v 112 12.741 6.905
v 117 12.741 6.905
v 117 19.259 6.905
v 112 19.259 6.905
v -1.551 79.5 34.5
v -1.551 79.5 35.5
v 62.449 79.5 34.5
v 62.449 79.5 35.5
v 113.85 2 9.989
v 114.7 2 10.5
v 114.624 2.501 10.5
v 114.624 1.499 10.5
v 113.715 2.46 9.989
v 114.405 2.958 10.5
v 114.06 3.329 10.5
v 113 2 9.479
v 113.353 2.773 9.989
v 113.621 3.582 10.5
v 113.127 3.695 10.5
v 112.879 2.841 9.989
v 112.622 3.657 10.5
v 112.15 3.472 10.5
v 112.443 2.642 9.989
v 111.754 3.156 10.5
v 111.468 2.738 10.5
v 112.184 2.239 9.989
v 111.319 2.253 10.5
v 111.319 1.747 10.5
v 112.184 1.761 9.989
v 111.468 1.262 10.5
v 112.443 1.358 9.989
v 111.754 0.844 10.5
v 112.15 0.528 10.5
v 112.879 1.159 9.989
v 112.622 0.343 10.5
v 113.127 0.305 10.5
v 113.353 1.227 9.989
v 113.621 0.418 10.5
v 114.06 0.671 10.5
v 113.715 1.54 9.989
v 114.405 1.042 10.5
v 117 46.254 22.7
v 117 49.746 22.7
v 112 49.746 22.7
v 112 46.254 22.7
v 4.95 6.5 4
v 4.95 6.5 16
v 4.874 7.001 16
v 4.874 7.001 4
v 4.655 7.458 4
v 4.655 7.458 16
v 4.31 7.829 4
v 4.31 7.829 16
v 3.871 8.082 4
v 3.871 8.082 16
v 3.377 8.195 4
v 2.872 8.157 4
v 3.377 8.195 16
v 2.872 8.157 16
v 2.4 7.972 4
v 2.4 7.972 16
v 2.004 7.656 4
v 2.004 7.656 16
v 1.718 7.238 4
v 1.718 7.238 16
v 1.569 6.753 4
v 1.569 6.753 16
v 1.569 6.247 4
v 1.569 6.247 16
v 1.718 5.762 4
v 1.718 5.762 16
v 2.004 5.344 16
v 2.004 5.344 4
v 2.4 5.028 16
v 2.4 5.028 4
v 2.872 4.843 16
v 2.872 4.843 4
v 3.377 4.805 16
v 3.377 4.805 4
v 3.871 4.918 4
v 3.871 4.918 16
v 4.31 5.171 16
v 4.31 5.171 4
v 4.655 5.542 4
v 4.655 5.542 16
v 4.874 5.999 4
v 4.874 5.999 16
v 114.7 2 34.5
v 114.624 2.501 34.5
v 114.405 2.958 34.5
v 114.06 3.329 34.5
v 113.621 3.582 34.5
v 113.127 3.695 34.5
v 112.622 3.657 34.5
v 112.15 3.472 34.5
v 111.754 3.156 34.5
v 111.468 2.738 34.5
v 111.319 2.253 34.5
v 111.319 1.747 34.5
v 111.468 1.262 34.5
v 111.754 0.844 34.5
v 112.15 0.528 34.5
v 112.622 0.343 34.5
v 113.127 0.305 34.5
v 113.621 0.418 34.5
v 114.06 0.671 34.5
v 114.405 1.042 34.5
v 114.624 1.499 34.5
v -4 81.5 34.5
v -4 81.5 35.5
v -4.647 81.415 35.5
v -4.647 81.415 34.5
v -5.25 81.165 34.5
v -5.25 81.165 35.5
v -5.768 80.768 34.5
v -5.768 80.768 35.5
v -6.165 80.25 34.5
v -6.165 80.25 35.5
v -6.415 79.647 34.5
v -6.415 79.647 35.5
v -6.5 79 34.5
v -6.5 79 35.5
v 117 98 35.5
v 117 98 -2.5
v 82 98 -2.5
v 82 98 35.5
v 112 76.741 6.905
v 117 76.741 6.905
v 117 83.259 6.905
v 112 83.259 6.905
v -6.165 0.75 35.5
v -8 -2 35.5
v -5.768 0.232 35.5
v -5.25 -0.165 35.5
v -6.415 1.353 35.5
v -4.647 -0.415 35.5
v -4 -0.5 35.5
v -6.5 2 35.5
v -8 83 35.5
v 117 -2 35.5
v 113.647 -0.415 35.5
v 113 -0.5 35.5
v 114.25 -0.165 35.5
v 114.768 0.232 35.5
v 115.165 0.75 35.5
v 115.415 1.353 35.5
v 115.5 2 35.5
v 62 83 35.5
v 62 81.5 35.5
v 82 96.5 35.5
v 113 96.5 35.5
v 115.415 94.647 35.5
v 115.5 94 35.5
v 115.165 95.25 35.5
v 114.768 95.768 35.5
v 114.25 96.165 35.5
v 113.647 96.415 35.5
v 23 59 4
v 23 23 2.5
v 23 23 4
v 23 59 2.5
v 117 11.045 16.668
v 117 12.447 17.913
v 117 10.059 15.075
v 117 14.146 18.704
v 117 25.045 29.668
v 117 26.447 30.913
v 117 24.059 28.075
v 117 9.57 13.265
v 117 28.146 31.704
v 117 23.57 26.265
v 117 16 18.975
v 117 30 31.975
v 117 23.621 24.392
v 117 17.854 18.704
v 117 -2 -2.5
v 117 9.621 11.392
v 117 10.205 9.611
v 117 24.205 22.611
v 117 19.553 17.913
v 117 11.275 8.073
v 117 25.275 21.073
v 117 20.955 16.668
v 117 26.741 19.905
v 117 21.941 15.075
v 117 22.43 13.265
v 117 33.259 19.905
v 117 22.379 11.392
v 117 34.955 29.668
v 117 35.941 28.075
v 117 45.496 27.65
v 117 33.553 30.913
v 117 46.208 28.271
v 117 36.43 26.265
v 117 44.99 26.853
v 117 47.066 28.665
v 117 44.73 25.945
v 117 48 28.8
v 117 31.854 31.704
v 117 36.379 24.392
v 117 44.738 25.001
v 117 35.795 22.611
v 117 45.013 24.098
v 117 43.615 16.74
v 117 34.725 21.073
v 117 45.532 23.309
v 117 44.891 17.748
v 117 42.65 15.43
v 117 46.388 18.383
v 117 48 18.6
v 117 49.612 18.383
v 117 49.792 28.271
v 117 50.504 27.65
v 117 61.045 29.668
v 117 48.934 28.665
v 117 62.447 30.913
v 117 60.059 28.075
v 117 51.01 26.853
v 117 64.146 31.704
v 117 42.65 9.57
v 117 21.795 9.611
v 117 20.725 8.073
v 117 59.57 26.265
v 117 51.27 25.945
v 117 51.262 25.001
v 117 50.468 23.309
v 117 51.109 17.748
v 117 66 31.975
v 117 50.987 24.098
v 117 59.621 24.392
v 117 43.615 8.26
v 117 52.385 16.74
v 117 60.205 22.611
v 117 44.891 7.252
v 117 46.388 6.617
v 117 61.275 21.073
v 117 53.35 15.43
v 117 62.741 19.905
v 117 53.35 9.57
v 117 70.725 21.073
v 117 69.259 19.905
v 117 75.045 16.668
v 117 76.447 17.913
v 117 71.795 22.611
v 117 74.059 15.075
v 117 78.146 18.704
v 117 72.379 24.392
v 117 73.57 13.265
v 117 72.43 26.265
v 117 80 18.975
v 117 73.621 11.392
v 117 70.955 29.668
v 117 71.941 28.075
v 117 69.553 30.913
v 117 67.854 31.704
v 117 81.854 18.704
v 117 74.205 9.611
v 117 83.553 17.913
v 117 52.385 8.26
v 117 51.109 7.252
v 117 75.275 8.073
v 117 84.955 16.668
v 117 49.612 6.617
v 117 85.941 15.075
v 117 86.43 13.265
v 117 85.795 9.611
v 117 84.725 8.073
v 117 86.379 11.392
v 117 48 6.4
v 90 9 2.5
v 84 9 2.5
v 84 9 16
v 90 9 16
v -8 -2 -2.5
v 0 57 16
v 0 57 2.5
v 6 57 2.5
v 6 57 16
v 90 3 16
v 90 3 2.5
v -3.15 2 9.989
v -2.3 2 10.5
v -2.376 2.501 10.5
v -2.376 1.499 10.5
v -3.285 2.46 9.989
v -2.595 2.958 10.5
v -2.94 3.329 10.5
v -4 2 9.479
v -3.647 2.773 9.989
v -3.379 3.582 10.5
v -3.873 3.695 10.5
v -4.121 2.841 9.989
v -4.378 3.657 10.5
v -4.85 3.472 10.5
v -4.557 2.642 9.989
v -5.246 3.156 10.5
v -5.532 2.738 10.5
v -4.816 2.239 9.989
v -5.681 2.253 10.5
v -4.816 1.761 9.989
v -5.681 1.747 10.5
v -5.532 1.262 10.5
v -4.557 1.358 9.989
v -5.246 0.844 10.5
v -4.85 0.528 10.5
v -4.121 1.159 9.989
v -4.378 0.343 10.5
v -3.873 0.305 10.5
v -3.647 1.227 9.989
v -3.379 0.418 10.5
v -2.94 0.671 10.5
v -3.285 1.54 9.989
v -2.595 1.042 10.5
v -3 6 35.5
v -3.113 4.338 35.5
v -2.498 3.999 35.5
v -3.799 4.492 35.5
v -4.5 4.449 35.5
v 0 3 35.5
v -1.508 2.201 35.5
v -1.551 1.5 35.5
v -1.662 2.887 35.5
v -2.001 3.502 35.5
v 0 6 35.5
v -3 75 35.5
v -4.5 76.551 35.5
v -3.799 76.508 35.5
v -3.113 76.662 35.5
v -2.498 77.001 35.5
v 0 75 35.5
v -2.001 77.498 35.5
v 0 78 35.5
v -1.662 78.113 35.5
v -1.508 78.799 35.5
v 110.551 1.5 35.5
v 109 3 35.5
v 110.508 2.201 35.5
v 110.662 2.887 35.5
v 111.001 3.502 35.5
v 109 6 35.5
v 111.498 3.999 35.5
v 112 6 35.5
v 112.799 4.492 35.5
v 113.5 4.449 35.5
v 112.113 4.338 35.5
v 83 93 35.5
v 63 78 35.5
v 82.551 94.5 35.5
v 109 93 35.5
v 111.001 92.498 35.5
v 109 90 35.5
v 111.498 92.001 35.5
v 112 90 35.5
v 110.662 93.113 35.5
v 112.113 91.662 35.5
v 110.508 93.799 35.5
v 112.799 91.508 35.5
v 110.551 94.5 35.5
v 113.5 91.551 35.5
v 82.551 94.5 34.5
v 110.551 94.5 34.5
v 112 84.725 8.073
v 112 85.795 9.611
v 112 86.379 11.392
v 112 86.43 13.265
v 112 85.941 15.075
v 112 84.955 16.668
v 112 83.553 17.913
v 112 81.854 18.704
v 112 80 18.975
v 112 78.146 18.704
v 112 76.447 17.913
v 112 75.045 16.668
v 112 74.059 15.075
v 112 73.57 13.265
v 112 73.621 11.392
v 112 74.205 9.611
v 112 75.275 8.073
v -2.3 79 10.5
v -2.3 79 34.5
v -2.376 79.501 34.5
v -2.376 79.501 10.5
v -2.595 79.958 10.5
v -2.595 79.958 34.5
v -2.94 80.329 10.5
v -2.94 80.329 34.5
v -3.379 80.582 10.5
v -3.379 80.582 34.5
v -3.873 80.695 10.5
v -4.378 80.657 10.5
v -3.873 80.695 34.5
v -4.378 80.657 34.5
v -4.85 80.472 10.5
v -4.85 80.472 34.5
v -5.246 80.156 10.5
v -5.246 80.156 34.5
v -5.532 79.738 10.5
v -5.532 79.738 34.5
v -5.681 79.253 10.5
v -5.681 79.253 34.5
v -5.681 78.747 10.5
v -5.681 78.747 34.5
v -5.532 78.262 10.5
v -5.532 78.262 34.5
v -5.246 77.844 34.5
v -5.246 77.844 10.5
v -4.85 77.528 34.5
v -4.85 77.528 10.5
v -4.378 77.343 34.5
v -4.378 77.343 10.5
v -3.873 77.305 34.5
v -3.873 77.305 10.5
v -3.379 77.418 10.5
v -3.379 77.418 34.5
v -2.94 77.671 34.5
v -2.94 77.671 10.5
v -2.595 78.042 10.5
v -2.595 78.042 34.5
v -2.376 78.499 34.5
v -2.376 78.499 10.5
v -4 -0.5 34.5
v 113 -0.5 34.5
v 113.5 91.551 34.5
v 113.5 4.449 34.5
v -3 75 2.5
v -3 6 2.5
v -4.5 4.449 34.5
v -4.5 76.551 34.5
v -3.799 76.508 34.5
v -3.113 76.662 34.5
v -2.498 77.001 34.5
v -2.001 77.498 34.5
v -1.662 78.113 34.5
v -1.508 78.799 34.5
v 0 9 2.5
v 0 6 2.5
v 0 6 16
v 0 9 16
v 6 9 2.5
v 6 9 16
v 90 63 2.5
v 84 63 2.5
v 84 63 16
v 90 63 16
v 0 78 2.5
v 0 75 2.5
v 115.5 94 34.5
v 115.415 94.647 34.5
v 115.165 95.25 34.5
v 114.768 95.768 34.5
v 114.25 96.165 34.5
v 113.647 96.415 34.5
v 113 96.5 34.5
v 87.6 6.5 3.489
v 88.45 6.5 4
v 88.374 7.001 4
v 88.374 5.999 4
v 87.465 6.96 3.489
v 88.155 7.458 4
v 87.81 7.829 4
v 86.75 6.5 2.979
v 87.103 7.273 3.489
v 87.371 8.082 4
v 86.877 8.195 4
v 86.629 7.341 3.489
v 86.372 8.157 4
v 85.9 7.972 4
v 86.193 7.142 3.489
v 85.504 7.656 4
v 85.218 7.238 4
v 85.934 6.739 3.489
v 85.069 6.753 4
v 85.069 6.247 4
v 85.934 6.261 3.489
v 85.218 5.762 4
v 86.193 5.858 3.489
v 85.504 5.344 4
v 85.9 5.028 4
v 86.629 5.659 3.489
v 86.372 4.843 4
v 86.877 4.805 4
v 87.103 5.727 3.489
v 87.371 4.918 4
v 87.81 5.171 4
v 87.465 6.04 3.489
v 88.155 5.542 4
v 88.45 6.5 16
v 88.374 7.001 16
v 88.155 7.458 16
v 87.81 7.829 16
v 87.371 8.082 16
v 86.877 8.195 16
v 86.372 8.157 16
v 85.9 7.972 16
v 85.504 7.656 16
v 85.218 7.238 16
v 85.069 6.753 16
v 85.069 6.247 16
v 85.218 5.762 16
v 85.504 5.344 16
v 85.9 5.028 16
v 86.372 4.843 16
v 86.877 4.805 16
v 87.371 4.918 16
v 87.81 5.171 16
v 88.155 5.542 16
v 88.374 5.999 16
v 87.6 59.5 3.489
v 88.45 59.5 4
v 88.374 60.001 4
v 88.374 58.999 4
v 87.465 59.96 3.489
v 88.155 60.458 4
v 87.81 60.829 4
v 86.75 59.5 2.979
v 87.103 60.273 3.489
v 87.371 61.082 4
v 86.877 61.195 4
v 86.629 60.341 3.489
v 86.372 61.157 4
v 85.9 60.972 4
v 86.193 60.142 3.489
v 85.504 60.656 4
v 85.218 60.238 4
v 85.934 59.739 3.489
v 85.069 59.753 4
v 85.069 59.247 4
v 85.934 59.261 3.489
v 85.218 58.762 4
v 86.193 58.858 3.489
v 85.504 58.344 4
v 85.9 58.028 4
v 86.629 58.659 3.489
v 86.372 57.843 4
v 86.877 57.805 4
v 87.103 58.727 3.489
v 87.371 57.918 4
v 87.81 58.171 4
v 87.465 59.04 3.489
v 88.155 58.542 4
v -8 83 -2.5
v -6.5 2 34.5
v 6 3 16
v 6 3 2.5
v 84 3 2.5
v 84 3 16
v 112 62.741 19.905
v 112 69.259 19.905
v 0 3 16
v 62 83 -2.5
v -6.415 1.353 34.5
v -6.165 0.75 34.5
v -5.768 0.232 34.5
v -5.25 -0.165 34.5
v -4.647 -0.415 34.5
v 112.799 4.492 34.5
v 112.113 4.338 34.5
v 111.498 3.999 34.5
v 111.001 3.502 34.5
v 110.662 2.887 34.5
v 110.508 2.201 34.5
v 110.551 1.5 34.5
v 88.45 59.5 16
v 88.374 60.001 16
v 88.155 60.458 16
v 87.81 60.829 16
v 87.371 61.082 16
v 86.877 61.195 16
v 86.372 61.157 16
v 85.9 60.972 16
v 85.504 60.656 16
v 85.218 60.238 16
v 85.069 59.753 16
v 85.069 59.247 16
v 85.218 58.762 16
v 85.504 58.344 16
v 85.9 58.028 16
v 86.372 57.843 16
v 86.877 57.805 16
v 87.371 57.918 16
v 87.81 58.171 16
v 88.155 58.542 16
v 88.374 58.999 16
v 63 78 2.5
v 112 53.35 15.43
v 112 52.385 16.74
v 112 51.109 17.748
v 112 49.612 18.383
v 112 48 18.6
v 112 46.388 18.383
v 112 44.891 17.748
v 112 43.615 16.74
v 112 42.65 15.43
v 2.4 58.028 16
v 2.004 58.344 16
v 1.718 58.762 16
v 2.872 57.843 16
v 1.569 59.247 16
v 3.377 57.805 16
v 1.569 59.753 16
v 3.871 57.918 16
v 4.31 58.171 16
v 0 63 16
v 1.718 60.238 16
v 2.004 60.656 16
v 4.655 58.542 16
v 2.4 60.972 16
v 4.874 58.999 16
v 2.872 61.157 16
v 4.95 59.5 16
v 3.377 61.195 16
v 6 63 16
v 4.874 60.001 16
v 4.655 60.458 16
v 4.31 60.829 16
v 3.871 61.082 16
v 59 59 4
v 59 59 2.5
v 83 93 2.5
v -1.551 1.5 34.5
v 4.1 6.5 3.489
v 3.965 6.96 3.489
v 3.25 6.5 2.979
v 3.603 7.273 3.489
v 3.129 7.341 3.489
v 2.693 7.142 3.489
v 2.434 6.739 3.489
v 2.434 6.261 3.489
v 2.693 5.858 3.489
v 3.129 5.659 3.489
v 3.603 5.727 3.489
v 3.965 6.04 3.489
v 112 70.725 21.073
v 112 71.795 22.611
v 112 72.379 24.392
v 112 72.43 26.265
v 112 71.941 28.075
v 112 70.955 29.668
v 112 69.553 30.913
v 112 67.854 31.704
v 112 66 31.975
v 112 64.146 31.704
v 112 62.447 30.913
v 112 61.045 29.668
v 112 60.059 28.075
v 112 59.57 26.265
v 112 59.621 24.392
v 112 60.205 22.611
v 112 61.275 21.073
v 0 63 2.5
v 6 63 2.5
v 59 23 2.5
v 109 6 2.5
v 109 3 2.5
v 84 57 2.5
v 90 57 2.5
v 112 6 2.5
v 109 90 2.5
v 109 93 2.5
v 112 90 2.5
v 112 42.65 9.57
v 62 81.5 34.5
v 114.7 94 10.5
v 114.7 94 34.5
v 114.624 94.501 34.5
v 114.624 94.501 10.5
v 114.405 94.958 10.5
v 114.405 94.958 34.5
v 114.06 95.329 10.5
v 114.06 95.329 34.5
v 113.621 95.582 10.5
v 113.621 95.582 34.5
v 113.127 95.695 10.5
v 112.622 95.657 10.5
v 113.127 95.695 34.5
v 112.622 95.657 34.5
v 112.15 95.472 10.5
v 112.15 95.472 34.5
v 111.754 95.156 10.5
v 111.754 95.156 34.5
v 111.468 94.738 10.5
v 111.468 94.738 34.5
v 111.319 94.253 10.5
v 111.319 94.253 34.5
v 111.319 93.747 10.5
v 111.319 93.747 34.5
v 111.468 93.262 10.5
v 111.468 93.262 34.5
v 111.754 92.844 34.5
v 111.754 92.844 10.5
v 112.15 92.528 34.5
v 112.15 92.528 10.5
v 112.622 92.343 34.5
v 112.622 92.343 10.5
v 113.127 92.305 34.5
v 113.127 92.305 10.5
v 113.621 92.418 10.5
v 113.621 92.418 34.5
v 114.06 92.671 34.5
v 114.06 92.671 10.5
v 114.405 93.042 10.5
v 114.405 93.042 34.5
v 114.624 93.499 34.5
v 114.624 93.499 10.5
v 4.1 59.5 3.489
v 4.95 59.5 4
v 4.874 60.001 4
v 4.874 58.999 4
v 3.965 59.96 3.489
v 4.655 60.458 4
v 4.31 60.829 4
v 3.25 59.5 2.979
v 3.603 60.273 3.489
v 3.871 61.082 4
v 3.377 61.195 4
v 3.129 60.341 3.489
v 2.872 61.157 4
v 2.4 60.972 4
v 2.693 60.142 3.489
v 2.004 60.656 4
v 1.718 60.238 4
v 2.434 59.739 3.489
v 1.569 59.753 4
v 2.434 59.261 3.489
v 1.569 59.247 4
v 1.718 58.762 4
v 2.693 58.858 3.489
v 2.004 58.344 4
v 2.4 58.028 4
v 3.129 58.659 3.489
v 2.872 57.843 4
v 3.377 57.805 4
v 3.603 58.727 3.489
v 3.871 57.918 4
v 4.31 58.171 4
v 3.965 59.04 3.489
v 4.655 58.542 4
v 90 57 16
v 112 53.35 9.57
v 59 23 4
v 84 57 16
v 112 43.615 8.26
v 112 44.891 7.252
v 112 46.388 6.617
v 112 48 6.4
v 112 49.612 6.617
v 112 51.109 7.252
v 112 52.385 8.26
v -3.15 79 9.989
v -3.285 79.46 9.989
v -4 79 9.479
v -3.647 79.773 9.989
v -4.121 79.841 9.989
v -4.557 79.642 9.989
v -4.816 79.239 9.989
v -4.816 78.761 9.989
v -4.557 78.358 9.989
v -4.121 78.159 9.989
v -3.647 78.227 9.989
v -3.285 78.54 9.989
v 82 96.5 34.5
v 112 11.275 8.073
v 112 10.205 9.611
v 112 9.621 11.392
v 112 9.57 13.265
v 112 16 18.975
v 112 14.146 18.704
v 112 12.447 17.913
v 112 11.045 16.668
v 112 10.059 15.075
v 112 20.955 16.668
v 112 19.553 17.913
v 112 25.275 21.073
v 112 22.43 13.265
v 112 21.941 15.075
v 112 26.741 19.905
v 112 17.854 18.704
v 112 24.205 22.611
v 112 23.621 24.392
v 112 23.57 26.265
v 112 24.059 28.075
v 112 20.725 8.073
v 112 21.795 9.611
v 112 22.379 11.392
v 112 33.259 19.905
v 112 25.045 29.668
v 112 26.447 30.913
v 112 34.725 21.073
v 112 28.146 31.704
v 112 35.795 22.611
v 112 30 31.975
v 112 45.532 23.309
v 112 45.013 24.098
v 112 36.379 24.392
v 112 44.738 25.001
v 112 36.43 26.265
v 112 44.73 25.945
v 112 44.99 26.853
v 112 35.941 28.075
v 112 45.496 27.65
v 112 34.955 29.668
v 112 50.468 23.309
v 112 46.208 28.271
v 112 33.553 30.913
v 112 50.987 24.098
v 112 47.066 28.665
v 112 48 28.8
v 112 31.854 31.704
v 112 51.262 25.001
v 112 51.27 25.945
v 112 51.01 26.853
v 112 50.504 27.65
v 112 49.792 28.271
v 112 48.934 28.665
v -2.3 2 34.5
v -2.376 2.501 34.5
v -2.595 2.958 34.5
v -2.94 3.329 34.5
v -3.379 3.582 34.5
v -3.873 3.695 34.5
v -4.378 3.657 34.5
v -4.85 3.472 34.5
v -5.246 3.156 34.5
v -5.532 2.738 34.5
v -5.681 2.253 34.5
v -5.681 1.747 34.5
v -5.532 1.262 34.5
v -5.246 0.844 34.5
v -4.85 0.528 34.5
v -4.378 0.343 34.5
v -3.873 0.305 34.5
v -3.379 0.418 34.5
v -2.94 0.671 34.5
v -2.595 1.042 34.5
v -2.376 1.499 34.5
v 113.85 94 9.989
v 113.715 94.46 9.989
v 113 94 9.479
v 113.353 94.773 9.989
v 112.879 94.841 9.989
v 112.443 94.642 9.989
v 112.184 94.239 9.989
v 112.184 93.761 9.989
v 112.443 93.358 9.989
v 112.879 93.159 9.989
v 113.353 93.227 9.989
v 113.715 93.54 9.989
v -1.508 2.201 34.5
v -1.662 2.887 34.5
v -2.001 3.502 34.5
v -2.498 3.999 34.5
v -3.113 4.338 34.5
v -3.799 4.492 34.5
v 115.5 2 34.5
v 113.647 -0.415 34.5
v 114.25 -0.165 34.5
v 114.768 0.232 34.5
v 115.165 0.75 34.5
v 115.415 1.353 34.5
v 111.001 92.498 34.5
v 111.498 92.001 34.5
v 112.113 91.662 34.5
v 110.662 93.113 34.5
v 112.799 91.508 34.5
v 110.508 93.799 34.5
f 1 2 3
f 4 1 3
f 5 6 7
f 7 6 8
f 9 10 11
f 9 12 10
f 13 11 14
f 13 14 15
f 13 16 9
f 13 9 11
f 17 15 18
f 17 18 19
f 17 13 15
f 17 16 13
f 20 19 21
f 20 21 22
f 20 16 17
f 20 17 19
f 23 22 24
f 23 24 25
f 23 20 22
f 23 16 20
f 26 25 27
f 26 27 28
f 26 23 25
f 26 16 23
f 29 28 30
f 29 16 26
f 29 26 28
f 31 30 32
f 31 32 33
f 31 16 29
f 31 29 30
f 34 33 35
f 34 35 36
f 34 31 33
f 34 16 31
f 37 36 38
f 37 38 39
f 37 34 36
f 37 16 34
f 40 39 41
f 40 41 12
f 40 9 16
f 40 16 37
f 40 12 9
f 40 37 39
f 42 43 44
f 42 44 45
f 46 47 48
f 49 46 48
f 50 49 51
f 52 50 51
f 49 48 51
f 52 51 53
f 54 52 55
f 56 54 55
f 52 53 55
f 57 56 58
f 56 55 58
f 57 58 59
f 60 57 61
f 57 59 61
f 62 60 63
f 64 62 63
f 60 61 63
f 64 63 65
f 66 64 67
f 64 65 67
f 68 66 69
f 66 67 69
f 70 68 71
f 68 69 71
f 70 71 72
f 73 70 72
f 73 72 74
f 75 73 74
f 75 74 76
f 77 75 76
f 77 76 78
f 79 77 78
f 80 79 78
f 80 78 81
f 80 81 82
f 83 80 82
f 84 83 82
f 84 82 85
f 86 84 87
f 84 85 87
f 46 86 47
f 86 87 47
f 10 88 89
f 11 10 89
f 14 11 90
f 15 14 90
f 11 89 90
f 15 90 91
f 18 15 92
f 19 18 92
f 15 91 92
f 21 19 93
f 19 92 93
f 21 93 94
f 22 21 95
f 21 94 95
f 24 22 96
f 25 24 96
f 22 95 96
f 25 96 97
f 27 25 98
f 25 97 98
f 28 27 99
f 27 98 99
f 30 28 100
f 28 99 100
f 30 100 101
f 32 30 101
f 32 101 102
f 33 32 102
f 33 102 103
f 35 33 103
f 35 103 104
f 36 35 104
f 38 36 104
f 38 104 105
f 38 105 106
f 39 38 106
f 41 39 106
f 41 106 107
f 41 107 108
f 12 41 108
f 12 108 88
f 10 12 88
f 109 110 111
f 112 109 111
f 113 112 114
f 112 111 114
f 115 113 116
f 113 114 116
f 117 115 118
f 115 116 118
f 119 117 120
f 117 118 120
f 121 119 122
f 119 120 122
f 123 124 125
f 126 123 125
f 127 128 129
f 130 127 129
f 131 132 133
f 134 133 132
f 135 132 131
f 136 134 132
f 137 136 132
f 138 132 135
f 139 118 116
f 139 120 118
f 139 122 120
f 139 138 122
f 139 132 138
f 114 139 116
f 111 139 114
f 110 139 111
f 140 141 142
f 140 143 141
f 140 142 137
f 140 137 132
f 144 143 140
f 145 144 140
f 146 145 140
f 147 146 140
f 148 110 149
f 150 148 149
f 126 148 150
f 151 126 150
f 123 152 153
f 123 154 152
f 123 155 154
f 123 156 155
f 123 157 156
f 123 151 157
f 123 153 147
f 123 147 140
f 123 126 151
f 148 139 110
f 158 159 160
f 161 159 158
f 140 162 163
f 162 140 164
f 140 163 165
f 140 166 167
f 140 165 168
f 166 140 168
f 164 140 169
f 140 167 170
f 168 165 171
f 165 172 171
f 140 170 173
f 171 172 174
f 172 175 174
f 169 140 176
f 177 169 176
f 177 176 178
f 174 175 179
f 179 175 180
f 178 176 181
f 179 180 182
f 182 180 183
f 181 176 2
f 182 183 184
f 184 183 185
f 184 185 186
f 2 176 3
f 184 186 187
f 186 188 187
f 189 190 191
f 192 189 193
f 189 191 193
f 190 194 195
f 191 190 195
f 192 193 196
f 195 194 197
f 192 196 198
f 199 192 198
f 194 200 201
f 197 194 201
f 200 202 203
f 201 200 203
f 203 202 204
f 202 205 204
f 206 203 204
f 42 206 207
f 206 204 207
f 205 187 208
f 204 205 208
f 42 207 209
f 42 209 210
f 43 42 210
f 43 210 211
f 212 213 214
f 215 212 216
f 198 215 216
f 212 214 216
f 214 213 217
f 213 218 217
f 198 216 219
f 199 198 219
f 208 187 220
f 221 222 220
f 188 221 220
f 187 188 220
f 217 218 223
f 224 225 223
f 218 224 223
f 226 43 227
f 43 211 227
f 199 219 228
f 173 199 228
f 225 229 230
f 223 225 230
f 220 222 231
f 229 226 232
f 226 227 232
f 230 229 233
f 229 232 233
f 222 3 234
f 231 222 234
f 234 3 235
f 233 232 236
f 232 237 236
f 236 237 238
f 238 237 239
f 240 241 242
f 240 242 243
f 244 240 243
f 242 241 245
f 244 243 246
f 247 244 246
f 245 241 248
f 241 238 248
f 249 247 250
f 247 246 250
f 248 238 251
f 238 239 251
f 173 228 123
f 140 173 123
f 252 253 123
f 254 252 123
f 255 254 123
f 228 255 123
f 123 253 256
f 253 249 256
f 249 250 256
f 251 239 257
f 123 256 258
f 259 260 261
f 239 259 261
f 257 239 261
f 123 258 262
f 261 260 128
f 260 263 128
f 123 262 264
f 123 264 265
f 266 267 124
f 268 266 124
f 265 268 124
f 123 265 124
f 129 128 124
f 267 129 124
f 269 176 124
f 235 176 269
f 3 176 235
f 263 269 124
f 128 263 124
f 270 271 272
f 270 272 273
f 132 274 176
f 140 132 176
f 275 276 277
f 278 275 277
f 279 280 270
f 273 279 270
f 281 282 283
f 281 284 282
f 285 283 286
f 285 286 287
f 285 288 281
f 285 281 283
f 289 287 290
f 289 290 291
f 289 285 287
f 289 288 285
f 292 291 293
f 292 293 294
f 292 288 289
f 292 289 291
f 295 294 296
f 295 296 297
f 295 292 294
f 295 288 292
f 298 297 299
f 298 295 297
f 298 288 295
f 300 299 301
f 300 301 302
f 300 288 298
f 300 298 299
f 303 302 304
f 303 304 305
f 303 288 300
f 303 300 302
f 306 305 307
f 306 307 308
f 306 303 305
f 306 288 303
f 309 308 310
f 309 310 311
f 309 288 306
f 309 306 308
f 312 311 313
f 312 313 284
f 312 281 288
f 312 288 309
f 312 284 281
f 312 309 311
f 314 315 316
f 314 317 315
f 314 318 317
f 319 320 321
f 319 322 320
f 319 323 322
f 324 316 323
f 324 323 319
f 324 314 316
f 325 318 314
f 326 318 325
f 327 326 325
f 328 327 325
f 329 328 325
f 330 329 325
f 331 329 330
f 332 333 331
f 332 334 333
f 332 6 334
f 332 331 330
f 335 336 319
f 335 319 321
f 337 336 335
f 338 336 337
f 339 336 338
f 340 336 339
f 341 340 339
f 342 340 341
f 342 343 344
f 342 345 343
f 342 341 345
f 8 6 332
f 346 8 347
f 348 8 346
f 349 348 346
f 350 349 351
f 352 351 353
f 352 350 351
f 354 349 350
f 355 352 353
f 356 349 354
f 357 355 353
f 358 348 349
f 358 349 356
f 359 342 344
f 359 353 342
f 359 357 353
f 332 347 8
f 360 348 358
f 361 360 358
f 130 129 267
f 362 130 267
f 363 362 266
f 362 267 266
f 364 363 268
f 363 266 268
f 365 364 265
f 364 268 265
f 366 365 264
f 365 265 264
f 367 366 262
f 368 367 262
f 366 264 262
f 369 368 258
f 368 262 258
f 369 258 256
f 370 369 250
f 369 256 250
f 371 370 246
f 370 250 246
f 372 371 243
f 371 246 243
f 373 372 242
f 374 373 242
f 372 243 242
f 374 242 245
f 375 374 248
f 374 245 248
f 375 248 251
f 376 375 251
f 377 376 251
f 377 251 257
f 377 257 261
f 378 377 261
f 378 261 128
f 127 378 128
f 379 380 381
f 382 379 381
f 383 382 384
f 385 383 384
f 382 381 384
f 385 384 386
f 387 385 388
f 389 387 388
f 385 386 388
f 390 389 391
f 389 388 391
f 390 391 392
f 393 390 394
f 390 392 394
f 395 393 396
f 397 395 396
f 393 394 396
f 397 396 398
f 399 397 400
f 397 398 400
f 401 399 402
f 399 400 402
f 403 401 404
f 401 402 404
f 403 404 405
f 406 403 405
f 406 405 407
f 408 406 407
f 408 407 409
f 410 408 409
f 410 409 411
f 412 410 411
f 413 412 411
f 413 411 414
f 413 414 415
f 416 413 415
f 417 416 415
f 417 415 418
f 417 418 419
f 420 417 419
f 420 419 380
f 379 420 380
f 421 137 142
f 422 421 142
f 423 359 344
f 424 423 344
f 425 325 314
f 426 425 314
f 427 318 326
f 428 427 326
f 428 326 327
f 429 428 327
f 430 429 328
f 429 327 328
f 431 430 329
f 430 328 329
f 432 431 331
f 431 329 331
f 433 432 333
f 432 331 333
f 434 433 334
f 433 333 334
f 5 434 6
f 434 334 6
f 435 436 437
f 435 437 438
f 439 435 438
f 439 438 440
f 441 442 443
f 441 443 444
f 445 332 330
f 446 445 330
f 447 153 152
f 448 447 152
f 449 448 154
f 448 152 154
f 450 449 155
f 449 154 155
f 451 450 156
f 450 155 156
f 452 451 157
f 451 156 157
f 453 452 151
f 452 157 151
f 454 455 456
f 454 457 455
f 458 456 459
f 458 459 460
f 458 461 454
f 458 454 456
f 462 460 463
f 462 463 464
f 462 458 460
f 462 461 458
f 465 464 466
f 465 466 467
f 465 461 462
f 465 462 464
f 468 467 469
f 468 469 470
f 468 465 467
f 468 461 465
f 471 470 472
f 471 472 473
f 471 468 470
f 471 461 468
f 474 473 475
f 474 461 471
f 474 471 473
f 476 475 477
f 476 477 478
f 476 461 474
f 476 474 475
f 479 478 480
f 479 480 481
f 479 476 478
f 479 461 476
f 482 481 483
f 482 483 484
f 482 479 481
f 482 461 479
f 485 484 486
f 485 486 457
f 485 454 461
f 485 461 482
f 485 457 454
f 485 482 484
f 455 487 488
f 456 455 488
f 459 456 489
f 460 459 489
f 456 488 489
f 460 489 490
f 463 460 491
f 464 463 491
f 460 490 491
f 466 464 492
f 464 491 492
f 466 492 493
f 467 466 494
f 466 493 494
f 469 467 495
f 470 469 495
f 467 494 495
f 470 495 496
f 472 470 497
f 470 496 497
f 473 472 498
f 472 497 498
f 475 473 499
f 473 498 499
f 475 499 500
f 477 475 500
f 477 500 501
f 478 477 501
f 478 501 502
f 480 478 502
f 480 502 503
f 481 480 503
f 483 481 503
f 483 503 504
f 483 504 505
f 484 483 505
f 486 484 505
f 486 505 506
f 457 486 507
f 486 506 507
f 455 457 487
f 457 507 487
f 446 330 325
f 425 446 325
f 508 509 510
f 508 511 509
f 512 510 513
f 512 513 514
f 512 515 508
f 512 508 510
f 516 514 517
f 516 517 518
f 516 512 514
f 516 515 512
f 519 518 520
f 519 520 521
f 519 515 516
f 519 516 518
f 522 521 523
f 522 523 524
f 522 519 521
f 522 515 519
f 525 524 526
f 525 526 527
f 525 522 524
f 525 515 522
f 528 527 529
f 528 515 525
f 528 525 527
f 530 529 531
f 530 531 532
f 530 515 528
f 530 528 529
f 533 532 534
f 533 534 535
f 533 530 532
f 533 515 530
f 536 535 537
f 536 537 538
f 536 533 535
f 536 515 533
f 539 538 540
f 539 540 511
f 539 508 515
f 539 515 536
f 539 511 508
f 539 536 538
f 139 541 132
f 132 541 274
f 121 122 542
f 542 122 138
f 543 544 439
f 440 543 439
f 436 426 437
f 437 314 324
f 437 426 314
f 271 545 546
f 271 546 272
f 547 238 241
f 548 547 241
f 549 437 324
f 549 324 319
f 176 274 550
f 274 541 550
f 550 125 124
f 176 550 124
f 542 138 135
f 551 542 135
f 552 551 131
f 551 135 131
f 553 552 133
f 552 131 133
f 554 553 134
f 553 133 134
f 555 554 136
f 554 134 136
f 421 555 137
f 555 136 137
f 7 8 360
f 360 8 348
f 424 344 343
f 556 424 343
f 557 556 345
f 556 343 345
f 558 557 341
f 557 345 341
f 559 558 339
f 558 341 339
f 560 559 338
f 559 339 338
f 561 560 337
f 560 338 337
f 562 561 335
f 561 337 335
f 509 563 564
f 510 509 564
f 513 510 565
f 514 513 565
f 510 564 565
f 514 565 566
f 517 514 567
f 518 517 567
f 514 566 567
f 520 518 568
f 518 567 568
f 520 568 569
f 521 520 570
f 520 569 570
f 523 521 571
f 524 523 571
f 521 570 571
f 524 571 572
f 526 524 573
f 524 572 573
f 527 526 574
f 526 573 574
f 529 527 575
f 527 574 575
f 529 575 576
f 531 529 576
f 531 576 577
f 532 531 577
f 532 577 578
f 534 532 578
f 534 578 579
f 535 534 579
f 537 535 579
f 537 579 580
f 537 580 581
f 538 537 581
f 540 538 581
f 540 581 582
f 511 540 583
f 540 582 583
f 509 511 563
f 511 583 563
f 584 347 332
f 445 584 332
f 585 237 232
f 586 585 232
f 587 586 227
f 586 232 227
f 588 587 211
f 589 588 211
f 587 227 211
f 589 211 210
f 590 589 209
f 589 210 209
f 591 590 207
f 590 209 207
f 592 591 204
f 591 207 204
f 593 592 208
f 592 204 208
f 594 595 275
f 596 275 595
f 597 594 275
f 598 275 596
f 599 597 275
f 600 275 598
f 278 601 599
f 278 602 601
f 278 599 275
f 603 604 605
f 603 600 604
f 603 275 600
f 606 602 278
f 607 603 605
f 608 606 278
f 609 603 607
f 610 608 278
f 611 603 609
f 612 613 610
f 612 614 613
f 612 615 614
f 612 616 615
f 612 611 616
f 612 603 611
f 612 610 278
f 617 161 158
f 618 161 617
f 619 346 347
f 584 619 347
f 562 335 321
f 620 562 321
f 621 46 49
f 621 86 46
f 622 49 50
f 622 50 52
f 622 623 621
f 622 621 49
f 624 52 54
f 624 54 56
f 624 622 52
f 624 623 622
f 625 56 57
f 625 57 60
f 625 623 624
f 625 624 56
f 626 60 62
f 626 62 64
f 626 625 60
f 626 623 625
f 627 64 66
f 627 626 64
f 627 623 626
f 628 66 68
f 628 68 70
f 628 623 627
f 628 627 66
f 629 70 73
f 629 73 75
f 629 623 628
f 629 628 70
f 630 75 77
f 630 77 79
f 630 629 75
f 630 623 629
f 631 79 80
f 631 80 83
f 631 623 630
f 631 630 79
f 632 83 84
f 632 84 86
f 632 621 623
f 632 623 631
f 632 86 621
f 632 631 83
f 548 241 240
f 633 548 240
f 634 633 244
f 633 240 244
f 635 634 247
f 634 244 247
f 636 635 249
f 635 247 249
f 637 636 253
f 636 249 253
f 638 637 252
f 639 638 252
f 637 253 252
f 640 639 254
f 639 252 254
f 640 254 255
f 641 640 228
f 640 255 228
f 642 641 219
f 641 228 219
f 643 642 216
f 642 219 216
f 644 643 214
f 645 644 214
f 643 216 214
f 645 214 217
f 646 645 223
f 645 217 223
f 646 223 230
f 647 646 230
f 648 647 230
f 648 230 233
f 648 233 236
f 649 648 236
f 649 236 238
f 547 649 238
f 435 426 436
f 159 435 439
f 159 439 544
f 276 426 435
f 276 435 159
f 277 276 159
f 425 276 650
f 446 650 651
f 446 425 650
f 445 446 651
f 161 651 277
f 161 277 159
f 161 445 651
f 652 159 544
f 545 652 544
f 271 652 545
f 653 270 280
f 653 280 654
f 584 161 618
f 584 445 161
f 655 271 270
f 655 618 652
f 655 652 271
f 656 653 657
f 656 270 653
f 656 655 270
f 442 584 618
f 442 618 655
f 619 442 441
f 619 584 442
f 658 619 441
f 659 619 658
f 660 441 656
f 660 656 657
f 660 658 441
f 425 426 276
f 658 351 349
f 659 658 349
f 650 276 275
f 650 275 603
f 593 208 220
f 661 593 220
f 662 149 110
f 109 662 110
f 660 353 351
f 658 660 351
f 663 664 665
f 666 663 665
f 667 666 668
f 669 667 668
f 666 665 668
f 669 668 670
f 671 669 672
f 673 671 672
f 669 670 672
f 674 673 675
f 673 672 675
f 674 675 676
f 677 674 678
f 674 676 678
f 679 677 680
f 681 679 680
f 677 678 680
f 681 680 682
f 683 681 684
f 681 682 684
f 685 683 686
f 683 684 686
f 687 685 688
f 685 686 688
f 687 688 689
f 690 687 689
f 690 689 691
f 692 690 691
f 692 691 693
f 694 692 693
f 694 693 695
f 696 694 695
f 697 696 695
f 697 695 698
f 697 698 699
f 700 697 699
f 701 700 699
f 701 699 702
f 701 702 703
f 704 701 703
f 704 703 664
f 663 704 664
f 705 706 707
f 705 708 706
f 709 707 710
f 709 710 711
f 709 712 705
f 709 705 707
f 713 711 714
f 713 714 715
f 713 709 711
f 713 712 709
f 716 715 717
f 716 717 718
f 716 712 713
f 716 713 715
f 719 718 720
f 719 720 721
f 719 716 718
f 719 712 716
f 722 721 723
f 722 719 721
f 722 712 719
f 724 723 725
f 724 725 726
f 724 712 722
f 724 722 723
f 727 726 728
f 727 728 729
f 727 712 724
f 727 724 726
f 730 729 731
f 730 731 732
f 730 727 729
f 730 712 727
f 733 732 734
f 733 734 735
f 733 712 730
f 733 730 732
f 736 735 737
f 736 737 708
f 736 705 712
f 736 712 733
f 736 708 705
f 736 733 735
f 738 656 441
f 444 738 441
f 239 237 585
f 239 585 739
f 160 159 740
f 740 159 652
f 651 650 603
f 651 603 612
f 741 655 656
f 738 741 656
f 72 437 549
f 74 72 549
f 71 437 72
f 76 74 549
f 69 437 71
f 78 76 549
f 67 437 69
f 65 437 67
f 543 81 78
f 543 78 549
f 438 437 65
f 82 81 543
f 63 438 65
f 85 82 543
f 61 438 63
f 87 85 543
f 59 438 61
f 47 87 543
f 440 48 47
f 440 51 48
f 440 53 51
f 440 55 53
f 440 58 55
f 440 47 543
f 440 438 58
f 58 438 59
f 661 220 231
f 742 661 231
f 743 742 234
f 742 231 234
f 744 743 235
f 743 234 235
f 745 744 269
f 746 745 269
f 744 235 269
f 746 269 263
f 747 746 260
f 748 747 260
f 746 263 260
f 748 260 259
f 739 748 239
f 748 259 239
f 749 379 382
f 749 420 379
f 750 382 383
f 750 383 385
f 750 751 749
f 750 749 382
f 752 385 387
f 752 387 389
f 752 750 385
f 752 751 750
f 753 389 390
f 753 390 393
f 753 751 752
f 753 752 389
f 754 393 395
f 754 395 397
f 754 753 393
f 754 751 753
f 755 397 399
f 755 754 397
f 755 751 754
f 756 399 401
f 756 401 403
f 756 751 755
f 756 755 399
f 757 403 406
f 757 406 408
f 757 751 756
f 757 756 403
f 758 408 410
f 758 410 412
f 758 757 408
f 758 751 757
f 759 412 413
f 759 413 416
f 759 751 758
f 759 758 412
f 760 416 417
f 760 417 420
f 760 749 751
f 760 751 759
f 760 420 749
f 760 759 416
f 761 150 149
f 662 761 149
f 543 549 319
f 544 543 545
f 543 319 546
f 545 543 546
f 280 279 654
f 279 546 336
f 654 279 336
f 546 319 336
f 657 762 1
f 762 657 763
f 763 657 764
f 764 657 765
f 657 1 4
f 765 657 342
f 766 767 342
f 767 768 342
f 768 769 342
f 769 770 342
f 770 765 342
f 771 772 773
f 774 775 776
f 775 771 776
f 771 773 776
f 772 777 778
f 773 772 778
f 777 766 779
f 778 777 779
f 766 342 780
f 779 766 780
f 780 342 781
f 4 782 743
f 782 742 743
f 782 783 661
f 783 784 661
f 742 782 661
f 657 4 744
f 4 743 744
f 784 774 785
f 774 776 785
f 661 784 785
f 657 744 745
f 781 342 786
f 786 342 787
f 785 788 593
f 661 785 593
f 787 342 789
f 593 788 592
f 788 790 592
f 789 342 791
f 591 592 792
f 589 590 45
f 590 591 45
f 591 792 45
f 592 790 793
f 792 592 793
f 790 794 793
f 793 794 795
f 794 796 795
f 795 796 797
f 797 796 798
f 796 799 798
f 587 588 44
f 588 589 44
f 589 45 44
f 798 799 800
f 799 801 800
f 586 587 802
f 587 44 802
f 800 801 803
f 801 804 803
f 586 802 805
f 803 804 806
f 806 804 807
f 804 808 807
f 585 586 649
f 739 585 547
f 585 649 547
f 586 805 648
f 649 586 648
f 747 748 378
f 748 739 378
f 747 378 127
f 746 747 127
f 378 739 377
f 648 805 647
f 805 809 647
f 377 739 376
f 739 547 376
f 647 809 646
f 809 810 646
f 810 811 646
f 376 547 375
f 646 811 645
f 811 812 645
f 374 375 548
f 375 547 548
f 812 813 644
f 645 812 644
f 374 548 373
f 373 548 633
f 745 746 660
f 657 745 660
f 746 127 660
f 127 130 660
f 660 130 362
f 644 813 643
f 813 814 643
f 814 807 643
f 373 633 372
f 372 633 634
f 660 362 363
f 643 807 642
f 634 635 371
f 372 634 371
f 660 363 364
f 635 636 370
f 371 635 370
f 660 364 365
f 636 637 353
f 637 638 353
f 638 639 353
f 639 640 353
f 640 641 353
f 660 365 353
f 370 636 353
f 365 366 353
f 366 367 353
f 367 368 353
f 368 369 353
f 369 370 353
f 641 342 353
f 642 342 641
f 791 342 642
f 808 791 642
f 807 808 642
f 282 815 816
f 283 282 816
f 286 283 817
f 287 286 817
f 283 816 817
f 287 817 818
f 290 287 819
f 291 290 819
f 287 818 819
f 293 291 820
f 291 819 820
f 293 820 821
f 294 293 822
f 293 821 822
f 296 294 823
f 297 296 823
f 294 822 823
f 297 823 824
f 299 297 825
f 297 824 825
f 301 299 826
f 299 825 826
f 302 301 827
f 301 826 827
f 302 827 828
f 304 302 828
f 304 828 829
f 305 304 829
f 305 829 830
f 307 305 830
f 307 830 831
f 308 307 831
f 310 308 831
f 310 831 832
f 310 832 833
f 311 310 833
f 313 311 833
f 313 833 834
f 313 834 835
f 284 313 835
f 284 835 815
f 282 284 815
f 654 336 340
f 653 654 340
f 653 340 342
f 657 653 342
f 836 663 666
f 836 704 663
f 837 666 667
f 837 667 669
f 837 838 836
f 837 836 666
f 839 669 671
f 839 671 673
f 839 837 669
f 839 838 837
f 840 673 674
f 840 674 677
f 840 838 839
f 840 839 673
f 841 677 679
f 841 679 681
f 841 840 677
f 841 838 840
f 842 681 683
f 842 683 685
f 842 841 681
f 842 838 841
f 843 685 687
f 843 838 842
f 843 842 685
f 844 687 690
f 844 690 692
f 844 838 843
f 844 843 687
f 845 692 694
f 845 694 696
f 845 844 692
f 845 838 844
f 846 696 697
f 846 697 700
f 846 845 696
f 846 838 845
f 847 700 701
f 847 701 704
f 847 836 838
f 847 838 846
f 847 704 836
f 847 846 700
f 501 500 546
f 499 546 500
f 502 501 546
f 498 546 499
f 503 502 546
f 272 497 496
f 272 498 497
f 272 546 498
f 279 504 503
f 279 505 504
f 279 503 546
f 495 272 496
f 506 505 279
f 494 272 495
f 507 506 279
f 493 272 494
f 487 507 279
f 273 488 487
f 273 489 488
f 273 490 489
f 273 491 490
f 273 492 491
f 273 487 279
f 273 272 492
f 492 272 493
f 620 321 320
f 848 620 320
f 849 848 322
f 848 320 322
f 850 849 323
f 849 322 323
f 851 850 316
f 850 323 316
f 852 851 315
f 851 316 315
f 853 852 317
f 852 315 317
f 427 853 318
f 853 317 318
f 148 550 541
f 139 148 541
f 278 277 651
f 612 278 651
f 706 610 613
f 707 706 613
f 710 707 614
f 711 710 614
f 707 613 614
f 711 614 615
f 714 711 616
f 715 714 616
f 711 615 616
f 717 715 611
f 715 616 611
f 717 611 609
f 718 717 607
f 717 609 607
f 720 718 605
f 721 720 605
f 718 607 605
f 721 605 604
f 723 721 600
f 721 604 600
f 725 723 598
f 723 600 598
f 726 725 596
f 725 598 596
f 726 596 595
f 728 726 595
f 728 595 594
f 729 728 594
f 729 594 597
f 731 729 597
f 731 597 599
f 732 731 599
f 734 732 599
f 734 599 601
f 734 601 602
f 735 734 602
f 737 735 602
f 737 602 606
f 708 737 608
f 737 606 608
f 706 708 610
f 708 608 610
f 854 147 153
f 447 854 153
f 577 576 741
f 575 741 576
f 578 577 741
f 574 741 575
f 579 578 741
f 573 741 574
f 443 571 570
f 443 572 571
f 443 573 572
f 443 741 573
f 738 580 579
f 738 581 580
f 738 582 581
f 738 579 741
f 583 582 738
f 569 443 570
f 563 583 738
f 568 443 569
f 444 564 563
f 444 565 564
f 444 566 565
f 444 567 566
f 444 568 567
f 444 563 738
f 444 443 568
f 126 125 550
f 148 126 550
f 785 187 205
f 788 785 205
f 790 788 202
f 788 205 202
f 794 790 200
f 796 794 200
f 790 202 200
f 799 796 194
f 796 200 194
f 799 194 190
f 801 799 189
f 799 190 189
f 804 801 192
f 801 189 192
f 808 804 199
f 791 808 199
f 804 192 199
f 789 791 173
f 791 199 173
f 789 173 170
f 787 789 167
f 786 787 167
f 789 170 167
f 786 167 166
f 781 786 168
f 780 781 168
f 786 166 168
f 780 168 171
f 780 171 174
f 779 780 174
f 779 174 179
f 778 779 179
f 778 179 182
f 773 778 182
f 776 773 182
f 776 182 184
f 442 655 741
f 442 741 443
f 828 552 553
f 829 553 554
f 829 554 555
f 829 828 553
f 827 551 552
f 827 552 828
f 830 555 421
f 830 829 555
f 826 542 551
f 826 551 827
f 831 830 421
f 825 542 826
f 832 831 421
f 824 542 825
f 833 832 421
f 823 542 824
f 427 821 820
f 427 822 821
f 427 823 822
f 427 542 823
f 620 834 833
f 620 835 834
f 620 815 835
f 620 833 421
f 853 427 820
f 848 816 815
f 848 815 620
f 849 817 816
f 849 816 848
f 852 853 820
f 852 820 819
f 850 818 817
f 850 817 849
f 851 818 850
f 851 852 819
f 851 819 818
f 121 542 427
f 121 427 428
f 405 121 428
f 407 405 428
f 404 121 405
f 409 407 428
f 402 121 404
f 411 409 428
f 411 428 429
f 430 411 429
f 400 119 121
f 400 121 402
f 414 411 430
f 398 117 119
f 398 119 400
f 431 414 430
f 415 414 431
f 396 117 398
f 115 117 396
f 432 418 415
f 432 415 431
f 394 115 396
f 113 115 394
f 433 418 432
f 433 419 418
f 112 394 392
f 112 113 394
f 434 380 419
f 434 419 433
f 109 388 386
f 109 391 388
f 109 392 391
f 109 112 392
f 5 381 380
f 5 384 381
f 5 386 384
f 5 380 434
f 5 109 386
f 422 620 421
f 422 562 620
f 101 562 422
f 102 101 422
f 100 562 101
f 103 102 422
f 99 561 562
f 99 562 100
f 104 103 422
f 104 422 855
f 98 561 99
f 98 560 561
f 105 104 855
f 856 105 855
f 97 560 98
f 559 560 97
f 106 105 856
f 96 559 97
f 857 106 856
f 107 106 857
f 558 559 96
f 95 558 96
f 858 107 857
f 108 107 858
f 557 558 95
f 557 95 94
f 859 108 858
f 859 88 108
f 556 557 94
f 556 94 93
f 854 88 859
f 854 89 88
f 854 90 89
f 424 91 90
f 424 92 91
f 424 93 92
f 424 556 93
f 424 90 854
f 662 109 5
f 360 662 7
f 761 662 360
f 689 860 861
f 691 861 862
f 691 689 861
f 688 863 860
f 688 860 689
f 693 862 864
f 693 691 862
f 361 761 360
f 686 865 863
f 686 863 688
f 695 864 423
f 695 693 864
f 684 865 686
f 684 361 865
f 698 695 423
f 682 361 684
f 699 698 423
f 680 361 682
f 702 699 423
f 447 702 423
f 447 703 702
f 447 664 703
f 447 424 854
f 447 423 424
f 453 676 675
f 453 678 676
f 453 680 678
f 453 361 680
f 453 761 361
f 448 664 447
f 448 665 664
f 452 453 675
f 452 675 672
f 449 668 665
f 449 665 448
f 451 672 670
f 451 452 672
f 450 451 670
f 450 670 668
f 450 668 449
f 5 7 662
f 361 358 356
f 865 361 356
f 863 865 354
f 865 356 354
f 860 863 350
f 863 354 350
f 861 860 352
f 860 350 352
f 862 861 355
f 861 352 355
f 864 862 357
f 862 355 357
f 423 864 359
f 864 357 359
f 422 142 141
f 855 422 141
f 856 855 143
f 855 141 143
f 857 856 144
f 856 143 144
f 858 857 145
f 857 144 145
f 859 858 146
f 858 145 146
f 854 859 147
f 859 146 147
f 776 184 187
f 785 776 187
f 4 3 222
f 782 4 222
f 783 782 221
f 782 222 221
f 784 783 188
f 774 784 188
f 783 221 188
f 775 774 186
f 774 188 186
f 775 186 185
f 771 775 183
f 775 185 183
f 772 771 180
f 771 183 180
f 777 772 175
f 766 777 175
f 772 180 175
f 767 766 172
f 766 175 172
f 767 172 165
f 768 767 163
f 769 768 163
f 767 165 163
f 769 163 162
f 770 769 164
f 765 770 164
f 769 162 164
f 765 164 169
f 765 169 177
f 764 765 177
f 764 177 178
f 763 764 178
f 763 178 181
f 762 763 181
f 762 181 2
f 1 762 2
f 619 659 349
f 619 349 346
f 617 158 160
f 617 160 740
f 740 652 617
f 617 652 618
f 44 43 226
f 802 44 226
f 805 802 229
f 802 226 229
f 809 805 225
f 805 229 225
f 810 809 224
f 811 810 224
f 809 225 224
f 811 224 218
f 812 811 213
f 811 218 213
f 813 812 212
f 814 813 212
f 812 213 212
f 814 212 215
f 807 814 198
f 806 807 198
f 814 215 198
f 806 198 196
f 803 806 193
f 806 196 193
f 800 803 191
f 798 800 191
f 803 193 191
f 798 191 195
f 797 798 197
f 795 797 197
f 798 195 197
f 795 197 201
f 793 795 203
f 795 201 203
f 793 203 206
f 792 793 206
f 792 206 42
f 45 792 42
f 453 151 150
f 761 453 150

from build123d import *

# Parameters (mm, degrees)
PAD_DEPTH       = 38
POCKET_DEPTH    = 33
SKETCH015_W     = 6
SKETCH015_H     = 6
PAD006_DEPTH    = 15.5
SKETCH018_W     = 36
SKETCH018_H     = 36
PAD008_DEPTH    = 3.5
POCKET008_DEPTH = 8
SKETCH025_R     = 1.7
HOLE_DEPTH      = 12
HOLE_TIPS_R     = 1.7
SKETCH026_R     = 1.7
HOLE003_DEPTH   = 25
HOLE003_TIPS_R  = 1.7
POCKET009_DEPTH = 1


with BuildPart() as part:
    # Sketch → Pad (new body)
    with BuildSketch(Plane.XY):
        Polygon((-8, -2), (117, -2), (117, 98), (82, 98), (62, 83), (-8, 83), align=None)
    extrude(amount=PAD_DEPTH)

    # Sketch001 (on Face8 of Pad) → Pocket (cut)
    with BuildSketch(Plane.XY.offset(38)):
        Polygon((-3, 75), (-3, 6), (0, 6), (0, 3), (109, 3), (109, 6), (112, 6), (112, 90), (109, 90), (109, 93), (83, 93), (63, 78), (0, 78), (0, 75), align=None)
    extrude(amount=-POCKET_DEPTH, mode=Mode.SUBTRACT)

    # Sketch015 → Pad006 (join)
    with BuildSketch(Plane.XY.offset(3)):
        with Locations((3, 60)):
            Rectangle(SKETCH015_W, SKETCH015_H)
        with Locations((87, 60)):
            Rectangle(SKETCH015_W, SKETCH015_H)
        with Locations((3, 6)):
            Rectangle(SKETCH015_W, SKETCH015_H)
        with Locations((87, 6)):
            Rectangle(SKETCH015_W, SKETCH015_H)
    extrude(amount=PAD006_DEPTH)

    # Sketch018 → Pad008 (join)
    with BuildSketch(Plane.XY.offset(3)):
        with Locations((41, 41)):
            Rectangle(SKETCH018_W, SKETCH018_H)
    extrude(amount=PAD008_DEPTH)

    # Sketch014 → Pocket008 (cut)
    with BuildSketch(Plane.YZ.offset(117)):
        with BuildLine():
            ThreePointArc((19.25908, 9.405), (16, 21.475), (12.74092, 9.405))
            Line((12.74092, 9.405), (19.25908, 9.405))
        make_face()
        with BuildLine():
            ThreePointArc((83.25908, 9.405), (80, 21.475), (76.74092, 9.405))
            Line((76.74092, 9.405), (83.25908, 9.405))
        make_face()
        with BuildLine():
            ThreePointArc((69.25908, 22.405), (66, 34.475), (62.74092, 22.405))
            Line((62.74092, 22.405), (69.25908, 22.405))
        make_face()
        with BuildLine():
            ThreePointArc((33.25908, 22.405), (30, 34.475), (26.74092, 22.405))
            Line((26.74092, 22.405), (33.25908, 22.405))
        make_face()
        with BuildLine():
            ThreePointArc((49.746425, 25.2), (48, 31.3), (46.253575, 25.2))
            Line((49.746425, 25.2), (46.253575, 25.2))
        make_face()
        with BuildLine():
            ThreePointArc((42.65, 12.069556), (48, 8.9), (53.35, 12.069556))
            Line((53.35, 17.930444), (53.35, 12.069556))
            ThreePointArc((53.35, 17.930444), (48, 21.1), (42.65, 17.930444))
            Line((42.65, 17.930444), (42.65, 12.069556))
        make_face()
    extrude(amount=-POCKET008_DEPTH, mode=Mode.SUBTRACT)

    # Sketch025 (on Face41 of Pocket008) → Hole (cut)
    with BuildSketch(Plane.XY.offset(18.5)):
        with Locations((3.25, 59.5)):
            Circle(SKETCH025_R)
        with Locations((3.25, 6.5)):
            Circle(SKETCH025_R)
        with Locations((86.75, 6.5)):
            Circle(SKETCH025_R)
        with Locations((86.75, 59.5)):
            Circle(SKETCH025_R)
    extrude(amount=-HOLE_DEPTH, mode=Mode.SUBTRACT)

    # Hole tips → Hole tip 1 section 0
    with BuildSketch(Plane.XY.offset(6.5), mode=Mode.PRIVATE) as hole_tip_1_s0:
        with Locations((3.25, 59.5)):
            Circle(HOLE_TIPS_R)
    loft([hole_tip_1_s0.sketch, Vertex(3.25, 59.5, 5.478537)], mode=Mode.SUBTRACT)

    # Hole tips → Hole tip 2 section 0
    with BuildSketch(Plane.XY.offset(6.5), mode=Mode.PRIVATE) as hole_tip_2_s0:
        with Locations((3.25, 6.5)):
            Circle(HOLE_TIPS_R)
    loft([hole_tip_2_s0.sketch, Vertex(3.25, 6.5, 5.478537)], mode=Mode.SUBTRACT)

    # Hole tips → Hole tip 3 section 0
    with BuildSketch(Plane.XY.offset(6.5), mode=Mode.PRIVATE) as hole_tip_3_s0:
        with Locations((86.75, 6.5)):
            Circle(HOLE_TIPS_R)
    loft([hole_tip_3_s0.sketch, Vertex(86.75, 6.5, 5.478537)], mode=Mode.SUBTRACT)

    # Hole tips → Hole tip 4 section 0
    with BuildSketch(Plane.XY.offset(6.5), mode=Mode.PRIVATE) as hole_tip_4_s0:
        with Locations((86.75, 59.5)):
            Circle(HOLE_TIPS_R)
    loft([hole_tip_4_s0.sketch, Vertex(86.75, 59.5, 5.478537)], mode=Mode.SUBTRACT)

    # Sketch026 (on Face5 of Hole) → Hole003 (cut)
    with BuildSketch(Plane.XY.offset(38)):
        with Locations((-4, 79)):
            Circle(SKETCH026_R)
        with Locations((113, 94)):
            Circle(SKETCH026_R)
        with Locations((113, 2)):
            Circle(SKETCH026_R)
        with Locations((-4, 2)):
            Circle(SKETCH026_R)
    extrude(amount=-HOLE003_DEPTH, mode=Mode.SUBTRACT)

    # Hole003 tips → Hole003 tip 1 section 0
    with BuildSketch(Plane.XY.offset(13), mode=Mode.PRIVATE) as hole003_tip_1_s0:
        with Locations((-4, 79)):
            Circle(HOLE003_TIPS_R)
    loft([hole003_tip_1_s0.sketch, Vertex(-4, 79, 11.978537)], mode=Mode.SUBTRACT)

    # Hole003 tips → Hole003 tip 2 section 0
    with BuildSketch(Plane.XY.offset(13), mode=Mode.PRIVATE) as hole003_tip_2_s0:
        with Locations((113, 94)):
            Circle(HOLE003_TIPS_R)
    loft([hole003_tip_2_s0.sketch, Vertex(113, 94, 11.978537)], mode=Mode.SUBTRACT)

    # Hole003 tips → Hole003 tip 3 section 0
    with BuildSketch(Plane.XY.offset(13), mode=Mode.PRIVATE) as hole003_tip_3_s0:
        with Locations((113, 2)):
            Circle(HOLE003_TIPS_R)
    loft([hole003_tip_3_s0.sketch, Vertex(113, 2, 11.978537)], mode=Mode.SUBTRACT)

    # Hole003 tips → Hole003 tip 4 section 0
    with BuildSketch(Plane.XY.offset(13), mode=Mode.PRIVATE) as hole003_tip_4_s0:
        with Locations((-4, 2)):
            Circle(HOLE003_TIPS_R)
    loft([hole003_tip_4_s0.sketch, Vertex(-4, 2, 11.978537)], mode=Mode.SUBTRACT)

    # Sketch027 (on Face5 of Hole003) → Pocket009 (cut)
    with BuildSketch(Plane.XY.offset(38)):
        with BuildLine():
            ThreePointArc((-4, 81.5), (-5.767767, 80.767767), (-6.5, 79))
            Line((-6.5, 79), (-6.5, 2))
            ThreePointArc((-6.5, 2), (-5.767767, 0.232233), (-4, -0.5))
            Line((-4, -0.5), (113, -0.5))
            ThreePointArc((113, -0.5), (114.767767, 0.232233), (115.5, 2))
            Line((115.5, 2), (115.5, 94))
            ThreePointArc((115.5, 94), (114.767767, 95.767767), (113, 96.5))
            Line((113, 96.5), (82, 96.5))
            Line((82, 96.5), (62, 81.5))
            Line((62, 81.5), (-4, 81.5))
        make_face()
        with BuildLine():
            ThreePointArc((113.5, 4.44949), (111.232233, 3.767767), (110.55051, 1.5))
            Line((110.55051, 1.5), (-1.55051, 1.5))
            ThreePointArc((-1.55051, 1.5), (-2.232233, 3.767767), (-4.5, 4.44949))
            Line((-4.5, 4.44949), (-4.5, 76.55051))
            ThreePointArc((-4.5, 76.55051), (-2.232233, 77.232233), (-1.55051, 79.5))
            Line((-1.55051, 79.5), (62.44949, 79.5))
            Line((62.44949, 79.5), (82.55051, 94.5))
            Line((82.55051, 94.5), (110.55051, 94.5))
            ThreePointArc((110.55051, 94.5), (111.232233, 92.232233), (113.5, 91.55051))
            Line((113.5, 91.55051), (113.5, 4.44949))
        make_face(mode=Mode.SUBTRACT)
    extrude(amount=-POCKET009_DEPTH, mode=Mode.SUBTRACT)


with BuildPart() as part_1:
    # Body placement: moved
    add(part.part.moved(Location((0, 0, -2.5))))


solid = part_1.part
